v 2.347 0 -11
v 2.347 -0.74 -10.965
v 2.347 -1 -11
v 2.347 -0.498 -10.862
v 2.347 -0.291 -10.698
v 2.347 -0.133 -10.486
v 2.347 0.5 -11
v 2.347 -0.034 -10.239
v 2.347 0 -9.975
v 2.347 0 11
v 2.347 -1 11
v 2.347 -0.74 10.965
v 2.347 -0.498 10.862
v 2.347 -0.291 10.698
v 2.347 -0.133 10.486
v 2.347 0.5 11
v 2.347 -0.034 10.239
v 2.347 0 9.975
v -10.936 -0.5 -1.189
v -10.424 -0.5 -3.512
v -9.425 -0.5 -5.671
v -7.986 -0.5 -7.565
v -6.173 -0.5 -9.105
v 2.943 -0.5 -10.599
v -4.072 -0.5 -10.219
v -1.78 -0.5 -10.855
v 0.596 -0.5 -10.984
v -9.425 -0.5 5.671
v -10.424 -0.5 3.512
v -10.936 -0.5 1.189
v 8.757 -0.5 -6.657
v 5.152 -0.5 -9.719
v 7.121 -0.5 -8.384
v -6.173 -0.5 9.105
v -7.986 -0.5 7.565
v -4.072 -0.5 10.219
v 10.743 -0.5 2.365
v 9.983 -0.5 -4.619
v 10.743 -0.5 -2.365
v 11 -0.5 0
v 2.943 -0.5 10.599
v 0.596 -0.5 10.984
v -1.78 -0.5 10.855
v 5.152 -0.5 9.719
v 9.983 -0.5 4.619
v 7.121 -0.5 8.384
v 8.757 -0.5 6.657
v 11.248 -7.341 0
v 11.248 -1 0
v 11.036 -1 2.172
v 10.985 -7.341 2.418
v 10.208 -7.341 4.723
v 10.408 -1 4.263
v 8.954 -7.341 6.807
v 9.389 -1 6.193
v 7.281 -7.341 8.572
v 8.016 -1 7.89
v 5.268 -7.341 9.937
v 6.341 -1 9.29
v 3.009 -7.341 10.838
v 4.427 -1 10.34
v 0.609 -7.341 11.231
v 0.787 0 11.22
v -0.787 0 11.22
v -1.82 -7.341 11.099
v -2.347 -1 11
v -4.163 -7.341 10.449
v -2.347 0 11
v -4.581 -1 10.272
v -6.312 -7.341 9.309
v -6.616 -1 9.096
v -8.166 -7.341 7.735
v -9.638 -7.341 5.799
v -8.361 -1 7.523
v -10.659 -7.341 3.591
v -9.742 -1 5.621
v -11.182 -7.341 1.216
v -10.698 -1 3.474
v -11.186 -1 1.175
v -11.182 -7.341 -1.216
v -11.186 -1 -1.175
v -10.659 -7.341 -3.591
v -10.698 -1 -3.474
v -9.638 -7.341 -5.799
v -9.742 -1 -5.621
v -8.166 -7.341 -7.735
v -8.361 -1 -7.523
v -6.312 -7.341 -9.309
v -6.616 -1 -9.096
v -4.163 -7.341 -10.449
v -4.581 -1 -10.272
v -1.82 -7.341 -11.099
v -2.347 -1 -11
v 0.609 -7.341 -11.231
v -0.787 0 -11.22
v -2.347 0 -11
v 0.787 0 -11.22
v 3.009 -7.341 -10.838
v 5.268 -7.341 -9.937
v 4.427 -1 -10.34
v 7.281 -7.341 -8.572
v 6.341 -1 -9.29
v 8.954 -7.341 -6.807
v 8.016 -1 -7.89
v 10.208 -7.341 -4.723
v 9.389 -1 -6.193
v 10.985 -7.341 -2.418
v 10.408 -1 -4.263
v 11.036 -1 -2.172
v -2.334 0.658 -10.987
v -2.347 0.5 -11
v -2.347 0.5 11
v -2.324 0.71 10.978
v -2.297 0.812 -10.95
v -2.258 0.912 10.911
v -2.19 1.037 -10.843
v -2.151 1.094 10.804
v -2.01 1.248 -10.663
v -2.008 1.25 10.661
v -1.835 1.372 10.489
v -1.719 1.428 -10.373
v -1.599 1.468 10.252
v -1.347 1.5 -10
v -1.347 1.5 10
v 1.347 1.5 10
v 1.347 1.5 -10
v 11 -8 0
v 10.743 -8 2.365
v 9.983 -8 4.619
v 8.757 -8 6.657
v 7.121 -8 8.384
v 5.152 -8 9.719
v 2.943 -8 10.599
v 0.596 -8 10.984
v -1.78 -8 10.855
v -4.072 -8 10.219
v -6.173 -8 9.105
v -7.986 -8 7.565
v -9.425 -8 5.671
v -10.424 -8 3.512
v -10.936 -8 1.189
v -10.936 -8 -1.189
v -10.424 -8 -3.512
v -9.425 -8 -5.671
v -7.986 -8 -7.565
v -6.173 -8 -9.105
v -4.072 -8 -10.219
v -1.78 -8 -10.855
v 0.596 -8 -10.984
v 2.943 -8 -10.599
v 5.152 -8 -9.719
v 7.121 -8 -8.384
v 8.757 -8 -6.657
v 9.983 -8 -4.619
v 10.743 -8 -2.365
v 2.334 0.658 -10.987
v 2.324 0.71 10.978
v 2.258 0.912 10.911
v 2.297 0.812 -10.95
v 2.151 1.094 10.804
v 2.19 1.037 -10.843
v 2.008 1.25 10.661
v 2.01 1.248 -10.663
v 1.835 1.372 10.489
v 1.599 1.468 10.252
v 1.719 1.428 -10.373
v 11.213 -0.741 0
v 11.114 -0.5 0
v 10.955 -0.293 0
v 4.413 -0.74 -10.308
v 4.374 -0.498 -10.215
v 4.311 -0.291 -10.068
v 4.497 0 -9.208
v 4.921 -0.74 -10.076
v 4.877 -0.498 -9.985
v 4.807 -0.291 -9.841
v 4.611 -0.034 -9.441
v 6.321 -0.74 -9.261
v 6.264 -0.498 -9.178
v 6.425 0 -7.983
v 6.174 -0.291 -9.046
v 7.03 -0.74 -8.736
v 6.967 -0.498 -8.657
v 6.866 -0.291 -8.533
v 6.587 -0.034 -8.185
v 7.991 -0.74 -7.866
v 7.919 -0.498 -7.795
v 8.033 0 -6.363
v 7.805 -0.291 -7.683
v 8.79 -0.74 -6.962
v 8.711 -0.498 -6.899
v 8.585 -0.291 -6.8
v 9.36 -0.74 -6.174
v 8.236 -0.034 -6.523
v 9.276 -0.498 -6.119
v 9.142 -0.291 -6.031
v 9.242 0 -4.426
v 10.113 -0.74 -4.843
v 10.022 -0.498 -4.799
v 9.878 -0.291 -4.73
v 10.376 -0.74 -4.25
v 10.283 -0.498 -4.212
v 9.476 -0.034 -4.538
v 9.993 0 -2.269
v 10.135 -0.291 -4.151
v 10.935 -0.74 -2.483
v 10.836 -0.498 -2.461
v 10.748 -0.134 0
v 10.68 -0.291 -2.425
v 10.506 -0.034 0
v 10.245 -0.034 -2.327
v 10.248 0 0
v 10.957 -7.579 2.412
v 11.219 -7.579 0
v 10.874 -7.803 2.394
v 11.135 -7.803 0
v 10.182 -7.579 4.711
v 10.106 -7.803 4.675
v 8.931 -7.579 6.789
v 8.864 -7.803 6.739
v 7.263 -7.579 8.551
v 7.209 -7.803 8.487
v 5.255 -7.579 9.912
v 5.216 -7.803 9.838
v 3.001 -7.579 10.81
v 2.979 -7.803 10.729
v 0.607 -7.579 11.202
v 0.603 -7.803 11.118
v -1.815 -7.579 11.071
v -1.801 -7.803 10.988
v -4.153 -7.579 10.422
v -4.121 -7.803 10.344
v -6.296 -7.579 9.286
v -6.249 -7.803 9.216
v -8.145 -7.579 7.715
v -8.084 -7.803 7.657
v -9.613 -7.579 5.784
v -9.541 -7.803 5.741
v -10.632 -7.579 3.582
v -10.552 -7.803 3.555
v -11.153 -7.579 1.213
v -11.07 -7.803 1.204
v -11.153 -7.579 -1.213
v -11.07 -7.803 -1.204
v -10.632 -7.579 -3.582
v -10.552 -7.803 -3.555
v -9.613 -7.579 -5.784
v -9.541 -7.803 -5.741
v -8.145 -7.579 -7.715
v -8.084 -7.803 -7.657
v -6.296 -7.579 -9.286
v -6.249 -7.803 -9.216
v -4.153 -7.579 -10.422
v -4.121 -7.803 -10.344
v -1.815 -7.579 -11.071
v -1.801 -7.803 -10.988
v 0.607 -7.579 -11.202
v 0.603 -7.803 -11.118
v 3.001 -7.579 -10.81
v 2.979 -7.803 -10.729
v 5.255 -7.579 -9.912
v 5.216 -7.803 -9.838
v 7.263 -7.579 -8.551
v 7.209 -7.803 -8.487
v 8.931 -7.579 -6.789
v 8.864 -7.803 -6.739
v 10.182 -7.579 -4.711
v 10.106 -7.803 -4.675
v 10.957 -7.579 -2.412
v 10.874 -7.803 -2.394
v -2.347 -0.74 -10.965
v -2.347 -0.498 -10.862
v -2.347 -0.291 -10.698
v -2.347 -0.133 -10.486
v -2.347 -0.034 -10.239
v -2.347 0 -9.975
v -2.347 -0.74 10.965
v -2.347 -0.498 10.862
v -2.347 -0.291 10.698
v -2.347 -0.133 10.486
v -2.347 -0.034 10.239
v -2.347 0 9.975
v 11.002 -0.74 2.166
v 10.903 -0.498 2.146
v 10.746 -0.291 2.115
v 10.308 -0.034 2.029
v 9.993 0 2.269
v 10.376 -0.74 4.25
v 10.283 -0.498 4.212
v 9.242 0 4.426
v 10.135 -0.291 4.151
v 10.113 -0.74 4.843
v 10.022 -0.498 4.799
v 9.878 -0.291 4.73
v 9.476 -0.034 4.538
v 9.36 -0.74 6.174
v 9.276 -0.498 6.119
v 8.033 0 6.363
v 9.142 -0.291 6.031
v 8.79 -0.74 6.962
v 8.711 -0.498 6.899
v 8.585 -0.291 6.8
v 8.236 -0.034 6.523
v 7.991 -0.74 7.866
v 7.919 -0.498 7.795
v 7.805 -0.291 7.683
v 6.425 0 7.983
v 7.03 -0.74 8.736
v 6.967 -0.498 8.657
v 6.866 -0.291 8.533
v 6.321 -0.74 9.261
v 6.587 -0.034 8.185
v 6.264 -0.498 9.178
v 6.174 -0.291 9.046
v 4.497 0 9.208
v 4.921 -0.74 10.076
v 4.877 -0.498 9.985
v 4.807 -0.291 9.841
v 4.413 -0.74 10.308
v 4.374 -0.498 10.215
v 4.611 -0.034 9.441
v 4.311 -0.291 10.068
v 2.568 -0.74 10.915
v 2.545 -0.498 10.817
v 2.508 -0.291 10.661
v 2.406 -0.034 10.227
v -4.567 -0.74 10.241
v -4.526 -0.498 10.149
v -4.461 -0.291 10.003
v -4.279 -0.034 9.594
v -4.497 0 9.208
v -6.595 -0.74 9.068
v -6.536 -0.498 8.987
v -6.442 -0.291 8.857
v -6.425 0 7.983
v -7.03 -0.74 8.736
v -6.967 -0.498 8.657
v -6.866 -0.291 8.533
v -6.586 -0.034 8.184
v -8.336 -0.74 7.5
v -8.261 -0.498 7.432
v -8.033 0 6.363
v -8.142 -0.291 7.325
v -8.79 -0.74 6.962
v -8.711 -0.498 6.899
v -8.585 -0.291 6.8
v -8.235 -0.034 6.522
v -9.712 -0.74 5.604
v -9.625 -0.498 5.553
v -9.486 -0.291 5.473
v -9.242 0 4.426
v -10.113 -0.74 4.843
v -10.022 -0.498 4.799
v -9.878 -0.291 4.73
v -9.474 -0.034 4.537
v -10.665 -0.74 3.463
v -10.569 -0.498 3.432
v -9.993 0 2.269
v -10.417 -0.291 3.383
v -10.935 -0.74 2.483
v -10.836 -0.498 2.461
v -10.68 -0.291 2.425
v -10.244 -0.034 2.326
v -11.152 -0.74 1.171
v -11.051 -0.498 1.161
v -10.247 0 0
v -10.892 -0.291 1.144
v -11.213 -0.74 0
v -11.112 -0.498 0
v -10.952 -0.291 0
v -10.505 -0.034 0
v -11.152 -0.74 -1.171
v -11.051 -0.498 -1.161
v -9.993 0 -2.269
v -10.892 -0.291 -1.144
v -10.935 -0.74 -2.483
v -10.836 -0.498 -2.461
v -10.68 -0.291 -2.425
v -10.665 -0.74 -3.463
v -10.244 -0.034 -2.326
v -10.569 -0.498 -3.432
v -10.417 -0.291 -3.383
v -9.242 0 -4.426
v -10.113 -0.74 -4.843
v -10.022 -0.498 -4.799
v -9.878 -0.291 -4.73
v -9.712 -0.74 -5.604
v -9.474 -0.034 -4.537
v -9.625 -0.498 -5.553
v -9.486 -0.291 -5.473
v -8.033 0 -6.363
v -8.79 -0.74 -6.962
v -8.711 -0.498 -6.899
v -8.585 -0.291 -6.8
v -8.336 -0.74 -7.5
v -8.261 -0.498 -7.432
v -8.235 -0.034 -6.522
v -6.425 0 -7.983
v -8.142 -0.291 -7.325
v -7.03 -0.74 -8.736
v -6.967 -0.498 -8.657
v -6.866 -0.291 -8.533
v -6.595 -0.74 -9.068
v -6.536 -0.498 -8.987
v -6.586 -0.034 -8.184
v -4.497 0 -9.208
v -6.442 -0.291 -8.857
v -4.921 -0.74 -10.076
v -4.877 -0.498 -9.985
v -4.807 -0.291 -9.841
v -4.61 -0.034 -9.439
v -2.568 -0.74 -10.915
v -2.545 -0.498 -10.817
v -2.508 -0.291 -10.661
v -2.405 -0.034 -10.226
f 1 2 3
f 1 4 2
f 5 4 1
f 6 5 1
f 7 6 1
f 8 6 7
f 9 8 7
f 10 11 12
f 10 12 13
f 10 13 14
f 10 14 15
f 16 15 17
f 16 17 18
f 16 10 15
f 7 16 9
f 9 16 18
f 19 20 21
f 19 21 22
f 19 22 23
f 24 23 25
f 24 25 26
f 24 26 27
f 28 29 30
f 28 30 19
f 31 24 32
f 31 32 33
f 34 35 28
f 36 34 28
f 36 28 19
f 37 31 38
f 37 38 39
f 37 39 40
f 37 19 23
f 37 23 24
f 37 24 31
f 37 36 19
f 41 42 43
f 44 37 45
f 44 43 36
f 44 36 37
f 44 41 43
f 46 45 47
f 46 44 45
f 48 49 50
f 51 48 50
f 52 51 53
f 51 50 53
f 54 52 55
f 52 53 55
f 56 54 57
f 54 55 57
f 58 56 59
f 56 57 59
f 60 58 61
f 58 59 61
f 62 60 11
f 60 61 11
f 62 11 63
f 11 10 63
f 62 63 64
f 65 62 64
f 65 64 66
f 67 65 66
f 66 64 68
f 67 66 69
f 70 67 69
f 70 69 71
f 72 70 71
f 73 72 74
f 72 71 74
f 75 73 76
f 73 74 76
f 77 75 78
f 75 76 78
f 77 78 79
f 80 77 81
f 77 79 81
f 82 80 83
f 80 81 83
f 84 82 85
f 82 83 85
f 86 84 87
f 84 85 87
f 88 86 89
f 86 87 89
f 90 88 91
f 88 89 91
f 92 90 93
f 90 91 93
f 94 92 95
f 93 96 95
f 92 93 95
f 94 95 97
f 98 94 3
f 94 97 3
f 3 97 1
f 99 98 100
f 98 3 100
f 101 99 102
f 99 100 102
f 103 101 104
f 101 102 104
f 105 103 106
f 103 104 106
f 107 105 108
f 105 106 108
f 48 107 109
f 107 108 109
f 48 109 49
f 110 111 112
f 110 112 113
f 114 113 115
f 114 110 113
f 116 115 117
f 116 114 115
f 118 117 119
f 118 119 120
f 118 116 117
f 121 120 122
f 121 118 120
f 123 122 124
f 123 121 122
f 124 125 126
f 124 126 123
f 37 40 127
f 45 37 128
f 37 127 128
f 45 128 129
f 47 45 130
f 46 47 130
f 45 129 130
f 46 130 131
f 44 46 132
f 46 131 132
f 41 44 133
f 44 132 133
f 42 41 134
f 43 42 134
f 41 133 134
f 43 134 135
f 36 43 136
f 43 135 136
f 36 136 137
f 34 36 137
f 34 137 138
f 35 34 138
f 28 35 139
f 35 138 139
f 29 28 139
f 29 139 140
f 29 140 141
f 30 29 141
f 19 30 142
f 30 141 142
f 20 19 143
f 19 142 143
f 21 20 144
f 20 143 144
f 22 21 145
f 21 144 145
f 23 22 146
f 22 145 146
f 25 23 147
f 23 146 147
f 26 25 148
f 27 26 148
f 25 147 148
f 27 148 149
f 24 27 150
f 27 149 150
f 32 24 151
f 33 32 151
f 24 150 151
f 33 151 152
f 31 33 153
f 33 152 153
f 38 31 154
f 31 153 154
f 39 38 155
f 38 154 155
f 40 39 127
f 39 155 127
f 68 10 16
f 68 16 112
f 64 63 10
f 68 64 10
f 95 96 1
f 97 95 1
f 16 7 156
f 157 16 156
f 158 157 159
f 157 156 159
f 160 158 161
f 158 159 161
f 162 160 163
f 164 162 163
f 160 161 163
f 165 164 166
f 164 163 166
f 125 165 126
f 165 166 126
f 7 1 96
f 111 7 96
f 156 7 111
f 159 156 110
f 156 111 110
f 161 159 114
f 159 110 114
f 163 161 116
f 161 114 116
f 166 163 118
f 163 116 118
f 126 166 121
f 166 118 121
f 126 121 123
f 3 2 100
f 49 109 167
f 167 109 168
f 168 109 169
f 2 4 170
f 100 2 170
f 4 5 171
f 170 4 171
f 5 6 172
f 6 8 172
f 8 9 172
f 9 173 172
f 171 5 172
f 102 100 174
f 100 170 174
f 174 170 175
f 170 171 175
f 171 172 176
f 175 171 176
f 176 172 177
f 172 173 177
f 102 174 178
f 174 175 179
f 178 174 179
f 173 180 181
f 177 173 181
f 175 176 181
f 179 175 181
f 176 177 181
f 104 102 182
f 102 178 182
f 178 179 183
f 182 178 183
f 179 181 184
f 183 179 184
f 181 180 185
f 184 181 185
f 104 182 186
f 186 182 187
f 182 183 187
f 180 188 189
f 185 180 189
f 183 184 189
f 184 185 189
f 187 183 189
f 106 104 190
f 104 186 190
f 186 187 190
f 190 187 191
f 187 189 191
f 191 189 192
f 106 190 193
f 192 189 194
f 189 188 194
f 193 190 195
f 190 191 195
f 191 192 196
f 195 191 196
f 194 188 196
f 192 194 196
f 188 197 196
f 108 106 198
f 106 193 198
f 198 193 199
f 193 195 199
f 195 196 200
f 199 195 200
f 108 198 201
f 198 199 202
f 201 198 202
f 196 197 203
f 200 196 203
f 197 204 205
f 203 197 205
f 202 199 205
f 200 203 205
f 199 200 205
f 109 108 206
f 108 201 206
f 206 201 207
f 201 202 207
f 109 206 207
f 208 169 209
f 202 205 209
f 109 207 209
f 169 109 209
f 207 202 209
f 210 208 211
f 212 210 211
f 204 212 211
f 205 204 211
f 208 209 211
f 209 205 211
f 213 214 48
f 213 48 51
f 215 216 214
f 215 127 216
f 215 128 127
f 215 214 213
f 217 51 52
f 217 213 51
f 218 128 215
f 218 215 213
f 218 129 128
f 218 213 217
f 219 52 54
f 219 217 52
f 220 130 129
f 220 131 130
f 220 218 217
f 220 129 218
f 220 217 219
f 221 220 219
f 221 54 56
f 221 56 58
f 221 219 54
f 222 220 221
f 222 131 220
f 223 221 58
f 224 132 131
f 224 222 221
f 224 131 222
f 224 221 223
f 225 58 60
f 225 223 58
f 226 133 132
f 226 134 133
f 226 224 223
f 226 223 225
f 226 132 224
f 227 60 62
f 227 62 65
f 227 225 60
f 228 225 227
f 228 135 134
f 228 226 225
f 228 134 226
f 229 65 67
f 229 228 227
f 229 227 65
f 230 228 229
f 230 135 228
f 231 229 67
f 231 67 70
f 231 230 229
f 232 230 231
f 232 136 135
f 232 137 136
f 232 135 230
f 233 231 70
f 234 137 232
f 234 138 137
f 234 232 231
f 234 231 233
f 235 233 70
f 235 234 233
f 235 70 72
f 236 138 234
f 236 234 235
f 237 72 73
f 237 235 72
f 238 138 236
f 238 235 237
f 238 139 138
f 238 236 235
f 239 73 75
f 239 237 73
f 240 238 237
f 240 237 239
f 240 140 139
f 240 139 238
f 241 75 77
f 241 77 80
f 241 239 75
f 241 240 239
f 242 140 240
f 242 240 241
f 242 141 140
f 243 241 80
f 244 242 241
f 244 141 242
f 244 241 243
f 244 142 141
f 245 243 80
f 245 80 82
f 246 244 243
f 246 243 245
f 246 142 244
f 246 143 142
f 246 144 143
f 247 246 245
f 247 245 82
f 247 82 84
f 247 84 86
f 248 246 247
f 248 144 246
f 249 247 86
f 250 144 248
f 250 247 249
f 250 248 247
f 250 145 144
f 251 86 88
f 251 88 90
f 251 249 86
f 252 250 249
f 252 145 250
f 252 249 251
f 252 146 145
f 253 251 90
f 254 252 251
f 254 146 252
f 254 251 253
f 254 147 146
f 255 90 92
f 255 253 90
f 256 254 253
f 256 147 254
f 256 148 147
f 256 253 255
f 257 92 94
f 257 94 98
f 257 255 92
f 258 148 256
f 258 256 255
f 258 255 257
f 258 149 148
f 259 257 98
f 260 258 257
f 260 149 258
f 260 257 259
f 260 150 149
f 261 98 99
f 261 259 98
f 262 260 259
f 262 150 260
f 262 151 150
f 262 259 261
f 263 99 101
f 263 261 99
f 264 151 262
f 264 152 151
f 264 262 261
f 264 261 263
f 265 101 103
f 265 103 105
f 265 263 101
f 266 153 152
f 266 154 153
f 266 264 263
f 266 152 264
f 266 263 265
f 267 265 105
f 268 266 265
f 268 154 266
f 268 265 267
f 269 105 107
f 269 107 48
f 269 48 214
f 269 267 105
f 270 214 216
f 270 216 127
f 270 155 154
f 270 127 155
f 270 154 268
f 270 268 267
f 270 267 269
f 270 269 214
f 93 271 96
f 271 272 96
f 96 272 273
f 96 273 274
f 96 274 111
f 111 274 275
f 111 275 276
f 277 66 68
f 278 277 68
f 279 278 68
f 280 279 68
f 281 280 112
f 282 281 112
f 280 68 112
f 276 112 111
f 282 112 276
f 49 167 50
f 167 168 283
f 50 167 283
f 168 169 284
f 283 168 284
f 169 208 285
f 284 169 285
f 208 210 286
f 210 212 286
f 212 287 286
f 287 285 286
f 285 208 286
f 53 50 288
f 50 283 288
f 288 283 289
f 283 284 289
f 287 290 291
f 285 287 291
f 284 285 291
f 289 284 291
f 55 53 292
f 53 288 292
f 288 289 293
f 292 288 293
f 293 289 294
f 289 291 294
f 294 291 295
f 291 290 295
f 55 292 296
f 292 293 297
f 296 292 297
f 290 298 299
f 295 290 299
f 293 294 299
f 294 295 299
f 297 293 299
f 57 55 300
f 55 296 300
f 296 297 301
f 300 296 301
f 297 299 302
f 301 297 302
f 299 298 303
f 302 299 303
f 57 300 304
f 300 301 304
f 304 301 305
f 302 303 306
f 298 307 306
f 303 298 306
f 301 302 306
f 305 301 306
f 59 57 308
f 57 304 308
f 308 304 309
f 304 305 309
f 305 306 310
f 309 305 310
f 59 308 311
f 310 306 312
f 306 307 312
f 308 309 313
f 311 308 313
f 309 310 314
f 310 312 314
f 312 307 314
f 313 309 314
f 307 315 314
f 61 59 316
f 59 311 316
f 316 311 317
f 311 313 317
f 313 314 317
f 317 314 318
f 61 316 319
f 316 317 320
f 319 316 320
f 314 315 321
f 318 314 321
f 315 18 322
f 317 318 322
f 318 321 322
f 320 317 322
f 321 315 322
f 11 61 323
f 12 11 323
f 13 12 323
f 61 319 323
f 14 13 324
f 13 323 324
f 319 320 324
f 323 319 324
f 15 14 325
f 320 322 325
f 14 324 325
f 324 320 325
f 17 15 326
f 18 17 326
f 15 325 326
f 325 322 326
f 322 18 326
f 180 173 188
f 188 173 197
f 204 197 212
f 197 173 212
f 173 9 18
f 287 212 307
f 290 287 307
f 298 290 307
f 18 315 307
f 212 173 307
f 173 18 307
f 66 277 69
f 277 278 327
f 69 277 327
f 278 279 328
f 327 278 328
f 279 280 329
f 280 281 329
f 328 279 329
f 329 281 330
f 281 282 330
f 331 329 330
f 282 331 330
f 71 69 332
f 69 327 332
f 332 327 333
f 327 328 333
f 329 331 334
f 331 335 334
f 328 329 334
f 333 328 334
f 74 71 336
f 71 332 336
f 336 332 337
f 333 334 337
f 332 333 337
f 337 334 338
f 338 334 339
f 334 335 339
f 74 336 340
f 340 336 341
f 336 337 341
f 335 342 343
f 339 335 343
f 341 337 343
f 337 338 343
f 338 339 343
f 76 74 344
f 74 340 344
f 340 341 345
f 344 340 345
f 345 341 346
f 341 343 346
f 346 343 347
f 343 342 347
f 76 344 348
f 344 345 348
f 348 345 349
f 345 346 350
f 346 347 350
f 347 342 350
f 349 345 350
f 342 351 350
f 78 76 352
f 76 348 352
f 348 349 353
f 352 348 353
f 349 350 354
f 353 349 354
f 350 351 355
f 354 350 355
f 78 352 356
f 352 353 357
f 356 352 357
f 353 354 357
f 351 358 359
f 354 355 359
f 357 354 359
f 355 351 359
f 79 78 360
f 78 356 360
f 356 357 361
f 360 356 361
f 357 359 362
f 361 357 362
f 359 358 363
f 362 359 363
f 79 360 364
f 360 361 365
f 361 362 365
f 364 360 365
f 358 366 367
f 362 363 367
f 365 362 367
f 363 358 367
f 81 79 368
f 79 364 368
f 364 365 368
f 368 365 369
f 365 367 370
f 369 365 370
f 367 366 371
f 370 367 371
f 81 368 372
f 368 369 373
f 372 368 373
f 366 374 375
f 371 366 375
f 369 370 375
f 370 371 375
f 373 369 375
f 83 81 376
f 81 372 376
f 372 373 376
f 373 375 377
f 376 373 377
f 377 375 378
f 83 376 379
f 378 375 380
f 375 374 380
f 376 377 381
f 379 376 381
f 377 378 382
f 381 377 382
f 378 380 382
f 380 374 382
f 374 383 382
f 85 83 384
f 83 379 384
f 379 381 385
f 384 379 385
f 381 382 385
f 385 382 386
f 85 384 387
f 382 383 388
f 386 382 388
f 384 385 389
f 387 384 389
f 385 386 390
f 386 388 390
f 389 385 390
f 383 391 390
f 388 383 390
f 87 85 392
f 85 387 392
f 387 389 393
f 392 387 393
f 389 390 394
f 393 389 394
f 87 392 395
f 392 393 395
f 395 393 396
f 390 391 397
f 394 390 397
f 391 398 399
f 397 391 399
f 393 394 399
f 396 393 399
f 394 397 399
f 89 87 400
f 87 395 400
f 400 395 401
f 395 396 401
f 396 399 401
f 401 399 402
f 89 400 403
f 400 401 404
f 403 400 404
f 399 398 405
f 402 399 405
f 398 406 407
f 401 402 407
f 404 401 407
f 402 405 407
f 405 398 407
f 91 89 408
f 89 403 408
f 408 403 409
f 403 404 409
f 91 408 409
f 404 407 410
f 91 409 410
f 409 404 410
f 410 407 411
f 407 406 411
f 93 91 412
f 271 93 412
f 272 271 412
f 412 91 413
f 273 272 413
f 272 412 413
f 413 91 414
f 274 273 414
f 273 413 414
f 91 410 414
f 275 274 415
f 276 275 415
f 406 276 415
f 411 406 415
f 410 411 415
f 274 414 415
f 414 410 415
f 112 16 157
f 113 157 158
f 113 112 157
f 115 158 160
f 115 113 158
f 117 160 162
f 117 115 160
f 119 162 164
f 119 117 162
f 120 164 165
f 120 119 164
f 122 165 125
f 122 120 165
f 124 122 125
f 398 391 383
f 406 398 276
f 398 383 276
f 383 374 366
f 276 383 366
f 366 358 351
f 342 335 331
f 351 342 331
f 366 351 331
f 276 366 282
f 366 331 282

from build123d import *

# Parameters (mm, degrees)
F0_R         = 11.2475
F1_DEPTH     = 8
F2_R         = 11
F3_DEPTH     = 7.5
F4_W         = 4.6930826756
F4_H         = 22
F5_DEPTH     = 1.5
F6_T1_DEPTH  = 9.6930826756
F6_T3_DEPTH  = 27
F6_T8_ANGLE  = 90.6971129065
F6_T13_ANGLE = 181.4172742502
F6_T18_ANGLE = 90.6971129065


# Not quite as in the source:
# - a fillet or chamfer that OpenCascade refuses, or shapes differently, is made with other operations: its cross-section is extruded or revolved along the edge and cut away or added


with BuildPart() as f1:
    # F0 (on Front) → F1 (new body)
    with BuildSketch(Plane.XZ):
        Circle(F0_R)
    extrude(amount=F1_DEPTH)

    # F2 (on face) → F3 (cut)
    with BuildSketch(Plane.XZ.offset(8)):
        Circle(F2_R)
    extrude(amount=-F3_DEPTH, mode=Mode.SUBTRACT)

    # F4 (on face) → F5 (join)
    with BuildSketch(Plane(origin=(0, 0, 0), x_dir=(-1, 0, 0), z_dir=(0, 1, 0))):
        Rectangle(F4_W, F4_H)
    extrude(amount=F5_DEPTH)

    # F6: fillet of radius 1 on 9 edges, made by hand

    # F6_s2 → F6_t1 (cut)
    with BuildSketch(Plane.YZ.offset(-4.8465413378)):
        with BuildLine():
            ThreePointArc((0.5, -11), (1.2071067812, -10.7071067812), (1.5, -10))
            Line((1.5, -10), (1.5, -11))
            Line((1.5, -11), (0.5, -11))
        make_face()
        with BuildLine():
            ThreePointArc((0.5, 11), (1.2071067812, 10.7071067812), (1.5, 10))
            Line((1.5, 10), (1.5, 11))
            Line((1.5, 11), (0.5, 11))
        make_face()
    extrude(amount=F6_T1_DEPTH, mode=Mode.SUBTRACT)

    # F6_s4 → F6_t3 (cut)
    with BuildSketch(Plane.XY.offset(-13.5)):
        with BuildLine():
            ThreePointArc((-2.3465413378, 0.5), (-2.053648119, 1.2071067812), (-1.3465413378, 1.5))
            Line((-1.3465413378, 1.5), (-2.3465413378, 1.5))
            Line((-2.3465413378, 1.5), (-2.3465413378, 0.5))
        make_face()
        with BuildLine():
            ThreePointArc((2.3465413378, 0.5), (2.053648119, 1.2071067812), (1.3465413378, 1.5))
            Line((1.3465413378, 1.5), (2.3465413378, 1.5))
            Line((2.3465413378, 1.5), (2.3465413378, 0.5))
        make_face()
    extrude(amount=F6_T3_DEPTH, mode=Mode.SUBTRACT)


with BuildPart() as f6_tool6:
    # F6_s7 → F6_t8 (revolve)
    with BuildSketch(Plane.XY):
        with BuildLine():
            ThreePointArc((11.2475, -1), (10.9546067812, -0.2928932188), (10.2475, 0))
            Line((10.2475, 0), (11.2475, 0))
            Line((11.2475, 0), (11.2475, -1))
        make_face()
    revolve(axis=Axis((0, 0, 0), (0, -1, 0)), revolution_arc=F6_T8_ANGLE)

    split(bisect_by=Plane.YZ.offset(2.3465413378), keep=Keep.TOP)


with BuildPart() as f1_1:
    add(f1.part)

    # F6_t5: cut F6_tool6
    add(f6_tool6.part, mode=Mode.SUBTRACT)


with BuildPart() as f6_tool11:
    # F6_s12 → F6_t13 (revolve)
    with BuildSketch(Plane(origin=(0, 0, 0), x_dir=(0, 1, 0), z_dir=(0.9999235166, 0, -0.0123677357))):
        with BuildLine():
            ThreePointArc((-1, 11.2475), (-0.2928932188, 10.9546067812), (0, 10.2475))
            Line((0, 10.2475), (0, 11.2475))
            Line((0, 11.2475), (-1, 11.2475))
        make_face()
    revolve(axis=Axis((0, 0, 0), (0, -1, 0)), revolution_arc=F6_T13_ANGLE)

    split(bisect_by=Plane.YZ.offset(-2.3465413378), keep=Keep.BOTTOM)


with BuildPart() as f1_2:
    add(f1_1.part)

    # F6_t10: cut F6_tool11
    add(f6_tool11.part, mode=Mode.SUBTRACT)


with BuildPart() as f6_tool16:
    # F6_s17 → F6_t18 (revolve)
    with BuildSketch(Plane(origin=(0, 0, 0), x_dir=(0, 1, 0), z_dir=(-0.999925984, 0, 0.0121666153))):
        with BuildLine():
            ThreePointArc((-1, 11.2475), (-0.2928932188, 10.9546067812), (0, 10.2475))
            Line((0, 10.2475), (0, 11.2475))
            Line((0, 11.2475), (-1, 11.2475))
        make_face()
    revolve(axis=Axis((0, 0, 0), (0, -1, 0)), revolution_arc=F6_T18_ANGLE)

    split(bisect_by=Plane.YZ.offset(2.3465413378), keep=Keep.TOP)


with BuildPart() as f1_3:
    add(f1_2.part)

    # F6_t15: cut F6_tool16
    add(f6_tool16.part, mode=Mode.SUBTRACT)

    # F6_s20 → F6_t21 (revolve, cut)
    with BuildSketch(Plane.XY):
        with BuildLine():
            ThreePointArc((11.2475, -7.3414077513), (11.1835822613, -7.6931889333), (11, -8))
            Line((11, -8), (11.2475, -8))
            Line((11.2475, -8), (11.2475, -7.3414077513))
        make_face()
    revolve(axis=Axis((0, -8, 0), (0, -1, 0)), mode=Mode.SUBTRACT)


solid = f1_3.part
